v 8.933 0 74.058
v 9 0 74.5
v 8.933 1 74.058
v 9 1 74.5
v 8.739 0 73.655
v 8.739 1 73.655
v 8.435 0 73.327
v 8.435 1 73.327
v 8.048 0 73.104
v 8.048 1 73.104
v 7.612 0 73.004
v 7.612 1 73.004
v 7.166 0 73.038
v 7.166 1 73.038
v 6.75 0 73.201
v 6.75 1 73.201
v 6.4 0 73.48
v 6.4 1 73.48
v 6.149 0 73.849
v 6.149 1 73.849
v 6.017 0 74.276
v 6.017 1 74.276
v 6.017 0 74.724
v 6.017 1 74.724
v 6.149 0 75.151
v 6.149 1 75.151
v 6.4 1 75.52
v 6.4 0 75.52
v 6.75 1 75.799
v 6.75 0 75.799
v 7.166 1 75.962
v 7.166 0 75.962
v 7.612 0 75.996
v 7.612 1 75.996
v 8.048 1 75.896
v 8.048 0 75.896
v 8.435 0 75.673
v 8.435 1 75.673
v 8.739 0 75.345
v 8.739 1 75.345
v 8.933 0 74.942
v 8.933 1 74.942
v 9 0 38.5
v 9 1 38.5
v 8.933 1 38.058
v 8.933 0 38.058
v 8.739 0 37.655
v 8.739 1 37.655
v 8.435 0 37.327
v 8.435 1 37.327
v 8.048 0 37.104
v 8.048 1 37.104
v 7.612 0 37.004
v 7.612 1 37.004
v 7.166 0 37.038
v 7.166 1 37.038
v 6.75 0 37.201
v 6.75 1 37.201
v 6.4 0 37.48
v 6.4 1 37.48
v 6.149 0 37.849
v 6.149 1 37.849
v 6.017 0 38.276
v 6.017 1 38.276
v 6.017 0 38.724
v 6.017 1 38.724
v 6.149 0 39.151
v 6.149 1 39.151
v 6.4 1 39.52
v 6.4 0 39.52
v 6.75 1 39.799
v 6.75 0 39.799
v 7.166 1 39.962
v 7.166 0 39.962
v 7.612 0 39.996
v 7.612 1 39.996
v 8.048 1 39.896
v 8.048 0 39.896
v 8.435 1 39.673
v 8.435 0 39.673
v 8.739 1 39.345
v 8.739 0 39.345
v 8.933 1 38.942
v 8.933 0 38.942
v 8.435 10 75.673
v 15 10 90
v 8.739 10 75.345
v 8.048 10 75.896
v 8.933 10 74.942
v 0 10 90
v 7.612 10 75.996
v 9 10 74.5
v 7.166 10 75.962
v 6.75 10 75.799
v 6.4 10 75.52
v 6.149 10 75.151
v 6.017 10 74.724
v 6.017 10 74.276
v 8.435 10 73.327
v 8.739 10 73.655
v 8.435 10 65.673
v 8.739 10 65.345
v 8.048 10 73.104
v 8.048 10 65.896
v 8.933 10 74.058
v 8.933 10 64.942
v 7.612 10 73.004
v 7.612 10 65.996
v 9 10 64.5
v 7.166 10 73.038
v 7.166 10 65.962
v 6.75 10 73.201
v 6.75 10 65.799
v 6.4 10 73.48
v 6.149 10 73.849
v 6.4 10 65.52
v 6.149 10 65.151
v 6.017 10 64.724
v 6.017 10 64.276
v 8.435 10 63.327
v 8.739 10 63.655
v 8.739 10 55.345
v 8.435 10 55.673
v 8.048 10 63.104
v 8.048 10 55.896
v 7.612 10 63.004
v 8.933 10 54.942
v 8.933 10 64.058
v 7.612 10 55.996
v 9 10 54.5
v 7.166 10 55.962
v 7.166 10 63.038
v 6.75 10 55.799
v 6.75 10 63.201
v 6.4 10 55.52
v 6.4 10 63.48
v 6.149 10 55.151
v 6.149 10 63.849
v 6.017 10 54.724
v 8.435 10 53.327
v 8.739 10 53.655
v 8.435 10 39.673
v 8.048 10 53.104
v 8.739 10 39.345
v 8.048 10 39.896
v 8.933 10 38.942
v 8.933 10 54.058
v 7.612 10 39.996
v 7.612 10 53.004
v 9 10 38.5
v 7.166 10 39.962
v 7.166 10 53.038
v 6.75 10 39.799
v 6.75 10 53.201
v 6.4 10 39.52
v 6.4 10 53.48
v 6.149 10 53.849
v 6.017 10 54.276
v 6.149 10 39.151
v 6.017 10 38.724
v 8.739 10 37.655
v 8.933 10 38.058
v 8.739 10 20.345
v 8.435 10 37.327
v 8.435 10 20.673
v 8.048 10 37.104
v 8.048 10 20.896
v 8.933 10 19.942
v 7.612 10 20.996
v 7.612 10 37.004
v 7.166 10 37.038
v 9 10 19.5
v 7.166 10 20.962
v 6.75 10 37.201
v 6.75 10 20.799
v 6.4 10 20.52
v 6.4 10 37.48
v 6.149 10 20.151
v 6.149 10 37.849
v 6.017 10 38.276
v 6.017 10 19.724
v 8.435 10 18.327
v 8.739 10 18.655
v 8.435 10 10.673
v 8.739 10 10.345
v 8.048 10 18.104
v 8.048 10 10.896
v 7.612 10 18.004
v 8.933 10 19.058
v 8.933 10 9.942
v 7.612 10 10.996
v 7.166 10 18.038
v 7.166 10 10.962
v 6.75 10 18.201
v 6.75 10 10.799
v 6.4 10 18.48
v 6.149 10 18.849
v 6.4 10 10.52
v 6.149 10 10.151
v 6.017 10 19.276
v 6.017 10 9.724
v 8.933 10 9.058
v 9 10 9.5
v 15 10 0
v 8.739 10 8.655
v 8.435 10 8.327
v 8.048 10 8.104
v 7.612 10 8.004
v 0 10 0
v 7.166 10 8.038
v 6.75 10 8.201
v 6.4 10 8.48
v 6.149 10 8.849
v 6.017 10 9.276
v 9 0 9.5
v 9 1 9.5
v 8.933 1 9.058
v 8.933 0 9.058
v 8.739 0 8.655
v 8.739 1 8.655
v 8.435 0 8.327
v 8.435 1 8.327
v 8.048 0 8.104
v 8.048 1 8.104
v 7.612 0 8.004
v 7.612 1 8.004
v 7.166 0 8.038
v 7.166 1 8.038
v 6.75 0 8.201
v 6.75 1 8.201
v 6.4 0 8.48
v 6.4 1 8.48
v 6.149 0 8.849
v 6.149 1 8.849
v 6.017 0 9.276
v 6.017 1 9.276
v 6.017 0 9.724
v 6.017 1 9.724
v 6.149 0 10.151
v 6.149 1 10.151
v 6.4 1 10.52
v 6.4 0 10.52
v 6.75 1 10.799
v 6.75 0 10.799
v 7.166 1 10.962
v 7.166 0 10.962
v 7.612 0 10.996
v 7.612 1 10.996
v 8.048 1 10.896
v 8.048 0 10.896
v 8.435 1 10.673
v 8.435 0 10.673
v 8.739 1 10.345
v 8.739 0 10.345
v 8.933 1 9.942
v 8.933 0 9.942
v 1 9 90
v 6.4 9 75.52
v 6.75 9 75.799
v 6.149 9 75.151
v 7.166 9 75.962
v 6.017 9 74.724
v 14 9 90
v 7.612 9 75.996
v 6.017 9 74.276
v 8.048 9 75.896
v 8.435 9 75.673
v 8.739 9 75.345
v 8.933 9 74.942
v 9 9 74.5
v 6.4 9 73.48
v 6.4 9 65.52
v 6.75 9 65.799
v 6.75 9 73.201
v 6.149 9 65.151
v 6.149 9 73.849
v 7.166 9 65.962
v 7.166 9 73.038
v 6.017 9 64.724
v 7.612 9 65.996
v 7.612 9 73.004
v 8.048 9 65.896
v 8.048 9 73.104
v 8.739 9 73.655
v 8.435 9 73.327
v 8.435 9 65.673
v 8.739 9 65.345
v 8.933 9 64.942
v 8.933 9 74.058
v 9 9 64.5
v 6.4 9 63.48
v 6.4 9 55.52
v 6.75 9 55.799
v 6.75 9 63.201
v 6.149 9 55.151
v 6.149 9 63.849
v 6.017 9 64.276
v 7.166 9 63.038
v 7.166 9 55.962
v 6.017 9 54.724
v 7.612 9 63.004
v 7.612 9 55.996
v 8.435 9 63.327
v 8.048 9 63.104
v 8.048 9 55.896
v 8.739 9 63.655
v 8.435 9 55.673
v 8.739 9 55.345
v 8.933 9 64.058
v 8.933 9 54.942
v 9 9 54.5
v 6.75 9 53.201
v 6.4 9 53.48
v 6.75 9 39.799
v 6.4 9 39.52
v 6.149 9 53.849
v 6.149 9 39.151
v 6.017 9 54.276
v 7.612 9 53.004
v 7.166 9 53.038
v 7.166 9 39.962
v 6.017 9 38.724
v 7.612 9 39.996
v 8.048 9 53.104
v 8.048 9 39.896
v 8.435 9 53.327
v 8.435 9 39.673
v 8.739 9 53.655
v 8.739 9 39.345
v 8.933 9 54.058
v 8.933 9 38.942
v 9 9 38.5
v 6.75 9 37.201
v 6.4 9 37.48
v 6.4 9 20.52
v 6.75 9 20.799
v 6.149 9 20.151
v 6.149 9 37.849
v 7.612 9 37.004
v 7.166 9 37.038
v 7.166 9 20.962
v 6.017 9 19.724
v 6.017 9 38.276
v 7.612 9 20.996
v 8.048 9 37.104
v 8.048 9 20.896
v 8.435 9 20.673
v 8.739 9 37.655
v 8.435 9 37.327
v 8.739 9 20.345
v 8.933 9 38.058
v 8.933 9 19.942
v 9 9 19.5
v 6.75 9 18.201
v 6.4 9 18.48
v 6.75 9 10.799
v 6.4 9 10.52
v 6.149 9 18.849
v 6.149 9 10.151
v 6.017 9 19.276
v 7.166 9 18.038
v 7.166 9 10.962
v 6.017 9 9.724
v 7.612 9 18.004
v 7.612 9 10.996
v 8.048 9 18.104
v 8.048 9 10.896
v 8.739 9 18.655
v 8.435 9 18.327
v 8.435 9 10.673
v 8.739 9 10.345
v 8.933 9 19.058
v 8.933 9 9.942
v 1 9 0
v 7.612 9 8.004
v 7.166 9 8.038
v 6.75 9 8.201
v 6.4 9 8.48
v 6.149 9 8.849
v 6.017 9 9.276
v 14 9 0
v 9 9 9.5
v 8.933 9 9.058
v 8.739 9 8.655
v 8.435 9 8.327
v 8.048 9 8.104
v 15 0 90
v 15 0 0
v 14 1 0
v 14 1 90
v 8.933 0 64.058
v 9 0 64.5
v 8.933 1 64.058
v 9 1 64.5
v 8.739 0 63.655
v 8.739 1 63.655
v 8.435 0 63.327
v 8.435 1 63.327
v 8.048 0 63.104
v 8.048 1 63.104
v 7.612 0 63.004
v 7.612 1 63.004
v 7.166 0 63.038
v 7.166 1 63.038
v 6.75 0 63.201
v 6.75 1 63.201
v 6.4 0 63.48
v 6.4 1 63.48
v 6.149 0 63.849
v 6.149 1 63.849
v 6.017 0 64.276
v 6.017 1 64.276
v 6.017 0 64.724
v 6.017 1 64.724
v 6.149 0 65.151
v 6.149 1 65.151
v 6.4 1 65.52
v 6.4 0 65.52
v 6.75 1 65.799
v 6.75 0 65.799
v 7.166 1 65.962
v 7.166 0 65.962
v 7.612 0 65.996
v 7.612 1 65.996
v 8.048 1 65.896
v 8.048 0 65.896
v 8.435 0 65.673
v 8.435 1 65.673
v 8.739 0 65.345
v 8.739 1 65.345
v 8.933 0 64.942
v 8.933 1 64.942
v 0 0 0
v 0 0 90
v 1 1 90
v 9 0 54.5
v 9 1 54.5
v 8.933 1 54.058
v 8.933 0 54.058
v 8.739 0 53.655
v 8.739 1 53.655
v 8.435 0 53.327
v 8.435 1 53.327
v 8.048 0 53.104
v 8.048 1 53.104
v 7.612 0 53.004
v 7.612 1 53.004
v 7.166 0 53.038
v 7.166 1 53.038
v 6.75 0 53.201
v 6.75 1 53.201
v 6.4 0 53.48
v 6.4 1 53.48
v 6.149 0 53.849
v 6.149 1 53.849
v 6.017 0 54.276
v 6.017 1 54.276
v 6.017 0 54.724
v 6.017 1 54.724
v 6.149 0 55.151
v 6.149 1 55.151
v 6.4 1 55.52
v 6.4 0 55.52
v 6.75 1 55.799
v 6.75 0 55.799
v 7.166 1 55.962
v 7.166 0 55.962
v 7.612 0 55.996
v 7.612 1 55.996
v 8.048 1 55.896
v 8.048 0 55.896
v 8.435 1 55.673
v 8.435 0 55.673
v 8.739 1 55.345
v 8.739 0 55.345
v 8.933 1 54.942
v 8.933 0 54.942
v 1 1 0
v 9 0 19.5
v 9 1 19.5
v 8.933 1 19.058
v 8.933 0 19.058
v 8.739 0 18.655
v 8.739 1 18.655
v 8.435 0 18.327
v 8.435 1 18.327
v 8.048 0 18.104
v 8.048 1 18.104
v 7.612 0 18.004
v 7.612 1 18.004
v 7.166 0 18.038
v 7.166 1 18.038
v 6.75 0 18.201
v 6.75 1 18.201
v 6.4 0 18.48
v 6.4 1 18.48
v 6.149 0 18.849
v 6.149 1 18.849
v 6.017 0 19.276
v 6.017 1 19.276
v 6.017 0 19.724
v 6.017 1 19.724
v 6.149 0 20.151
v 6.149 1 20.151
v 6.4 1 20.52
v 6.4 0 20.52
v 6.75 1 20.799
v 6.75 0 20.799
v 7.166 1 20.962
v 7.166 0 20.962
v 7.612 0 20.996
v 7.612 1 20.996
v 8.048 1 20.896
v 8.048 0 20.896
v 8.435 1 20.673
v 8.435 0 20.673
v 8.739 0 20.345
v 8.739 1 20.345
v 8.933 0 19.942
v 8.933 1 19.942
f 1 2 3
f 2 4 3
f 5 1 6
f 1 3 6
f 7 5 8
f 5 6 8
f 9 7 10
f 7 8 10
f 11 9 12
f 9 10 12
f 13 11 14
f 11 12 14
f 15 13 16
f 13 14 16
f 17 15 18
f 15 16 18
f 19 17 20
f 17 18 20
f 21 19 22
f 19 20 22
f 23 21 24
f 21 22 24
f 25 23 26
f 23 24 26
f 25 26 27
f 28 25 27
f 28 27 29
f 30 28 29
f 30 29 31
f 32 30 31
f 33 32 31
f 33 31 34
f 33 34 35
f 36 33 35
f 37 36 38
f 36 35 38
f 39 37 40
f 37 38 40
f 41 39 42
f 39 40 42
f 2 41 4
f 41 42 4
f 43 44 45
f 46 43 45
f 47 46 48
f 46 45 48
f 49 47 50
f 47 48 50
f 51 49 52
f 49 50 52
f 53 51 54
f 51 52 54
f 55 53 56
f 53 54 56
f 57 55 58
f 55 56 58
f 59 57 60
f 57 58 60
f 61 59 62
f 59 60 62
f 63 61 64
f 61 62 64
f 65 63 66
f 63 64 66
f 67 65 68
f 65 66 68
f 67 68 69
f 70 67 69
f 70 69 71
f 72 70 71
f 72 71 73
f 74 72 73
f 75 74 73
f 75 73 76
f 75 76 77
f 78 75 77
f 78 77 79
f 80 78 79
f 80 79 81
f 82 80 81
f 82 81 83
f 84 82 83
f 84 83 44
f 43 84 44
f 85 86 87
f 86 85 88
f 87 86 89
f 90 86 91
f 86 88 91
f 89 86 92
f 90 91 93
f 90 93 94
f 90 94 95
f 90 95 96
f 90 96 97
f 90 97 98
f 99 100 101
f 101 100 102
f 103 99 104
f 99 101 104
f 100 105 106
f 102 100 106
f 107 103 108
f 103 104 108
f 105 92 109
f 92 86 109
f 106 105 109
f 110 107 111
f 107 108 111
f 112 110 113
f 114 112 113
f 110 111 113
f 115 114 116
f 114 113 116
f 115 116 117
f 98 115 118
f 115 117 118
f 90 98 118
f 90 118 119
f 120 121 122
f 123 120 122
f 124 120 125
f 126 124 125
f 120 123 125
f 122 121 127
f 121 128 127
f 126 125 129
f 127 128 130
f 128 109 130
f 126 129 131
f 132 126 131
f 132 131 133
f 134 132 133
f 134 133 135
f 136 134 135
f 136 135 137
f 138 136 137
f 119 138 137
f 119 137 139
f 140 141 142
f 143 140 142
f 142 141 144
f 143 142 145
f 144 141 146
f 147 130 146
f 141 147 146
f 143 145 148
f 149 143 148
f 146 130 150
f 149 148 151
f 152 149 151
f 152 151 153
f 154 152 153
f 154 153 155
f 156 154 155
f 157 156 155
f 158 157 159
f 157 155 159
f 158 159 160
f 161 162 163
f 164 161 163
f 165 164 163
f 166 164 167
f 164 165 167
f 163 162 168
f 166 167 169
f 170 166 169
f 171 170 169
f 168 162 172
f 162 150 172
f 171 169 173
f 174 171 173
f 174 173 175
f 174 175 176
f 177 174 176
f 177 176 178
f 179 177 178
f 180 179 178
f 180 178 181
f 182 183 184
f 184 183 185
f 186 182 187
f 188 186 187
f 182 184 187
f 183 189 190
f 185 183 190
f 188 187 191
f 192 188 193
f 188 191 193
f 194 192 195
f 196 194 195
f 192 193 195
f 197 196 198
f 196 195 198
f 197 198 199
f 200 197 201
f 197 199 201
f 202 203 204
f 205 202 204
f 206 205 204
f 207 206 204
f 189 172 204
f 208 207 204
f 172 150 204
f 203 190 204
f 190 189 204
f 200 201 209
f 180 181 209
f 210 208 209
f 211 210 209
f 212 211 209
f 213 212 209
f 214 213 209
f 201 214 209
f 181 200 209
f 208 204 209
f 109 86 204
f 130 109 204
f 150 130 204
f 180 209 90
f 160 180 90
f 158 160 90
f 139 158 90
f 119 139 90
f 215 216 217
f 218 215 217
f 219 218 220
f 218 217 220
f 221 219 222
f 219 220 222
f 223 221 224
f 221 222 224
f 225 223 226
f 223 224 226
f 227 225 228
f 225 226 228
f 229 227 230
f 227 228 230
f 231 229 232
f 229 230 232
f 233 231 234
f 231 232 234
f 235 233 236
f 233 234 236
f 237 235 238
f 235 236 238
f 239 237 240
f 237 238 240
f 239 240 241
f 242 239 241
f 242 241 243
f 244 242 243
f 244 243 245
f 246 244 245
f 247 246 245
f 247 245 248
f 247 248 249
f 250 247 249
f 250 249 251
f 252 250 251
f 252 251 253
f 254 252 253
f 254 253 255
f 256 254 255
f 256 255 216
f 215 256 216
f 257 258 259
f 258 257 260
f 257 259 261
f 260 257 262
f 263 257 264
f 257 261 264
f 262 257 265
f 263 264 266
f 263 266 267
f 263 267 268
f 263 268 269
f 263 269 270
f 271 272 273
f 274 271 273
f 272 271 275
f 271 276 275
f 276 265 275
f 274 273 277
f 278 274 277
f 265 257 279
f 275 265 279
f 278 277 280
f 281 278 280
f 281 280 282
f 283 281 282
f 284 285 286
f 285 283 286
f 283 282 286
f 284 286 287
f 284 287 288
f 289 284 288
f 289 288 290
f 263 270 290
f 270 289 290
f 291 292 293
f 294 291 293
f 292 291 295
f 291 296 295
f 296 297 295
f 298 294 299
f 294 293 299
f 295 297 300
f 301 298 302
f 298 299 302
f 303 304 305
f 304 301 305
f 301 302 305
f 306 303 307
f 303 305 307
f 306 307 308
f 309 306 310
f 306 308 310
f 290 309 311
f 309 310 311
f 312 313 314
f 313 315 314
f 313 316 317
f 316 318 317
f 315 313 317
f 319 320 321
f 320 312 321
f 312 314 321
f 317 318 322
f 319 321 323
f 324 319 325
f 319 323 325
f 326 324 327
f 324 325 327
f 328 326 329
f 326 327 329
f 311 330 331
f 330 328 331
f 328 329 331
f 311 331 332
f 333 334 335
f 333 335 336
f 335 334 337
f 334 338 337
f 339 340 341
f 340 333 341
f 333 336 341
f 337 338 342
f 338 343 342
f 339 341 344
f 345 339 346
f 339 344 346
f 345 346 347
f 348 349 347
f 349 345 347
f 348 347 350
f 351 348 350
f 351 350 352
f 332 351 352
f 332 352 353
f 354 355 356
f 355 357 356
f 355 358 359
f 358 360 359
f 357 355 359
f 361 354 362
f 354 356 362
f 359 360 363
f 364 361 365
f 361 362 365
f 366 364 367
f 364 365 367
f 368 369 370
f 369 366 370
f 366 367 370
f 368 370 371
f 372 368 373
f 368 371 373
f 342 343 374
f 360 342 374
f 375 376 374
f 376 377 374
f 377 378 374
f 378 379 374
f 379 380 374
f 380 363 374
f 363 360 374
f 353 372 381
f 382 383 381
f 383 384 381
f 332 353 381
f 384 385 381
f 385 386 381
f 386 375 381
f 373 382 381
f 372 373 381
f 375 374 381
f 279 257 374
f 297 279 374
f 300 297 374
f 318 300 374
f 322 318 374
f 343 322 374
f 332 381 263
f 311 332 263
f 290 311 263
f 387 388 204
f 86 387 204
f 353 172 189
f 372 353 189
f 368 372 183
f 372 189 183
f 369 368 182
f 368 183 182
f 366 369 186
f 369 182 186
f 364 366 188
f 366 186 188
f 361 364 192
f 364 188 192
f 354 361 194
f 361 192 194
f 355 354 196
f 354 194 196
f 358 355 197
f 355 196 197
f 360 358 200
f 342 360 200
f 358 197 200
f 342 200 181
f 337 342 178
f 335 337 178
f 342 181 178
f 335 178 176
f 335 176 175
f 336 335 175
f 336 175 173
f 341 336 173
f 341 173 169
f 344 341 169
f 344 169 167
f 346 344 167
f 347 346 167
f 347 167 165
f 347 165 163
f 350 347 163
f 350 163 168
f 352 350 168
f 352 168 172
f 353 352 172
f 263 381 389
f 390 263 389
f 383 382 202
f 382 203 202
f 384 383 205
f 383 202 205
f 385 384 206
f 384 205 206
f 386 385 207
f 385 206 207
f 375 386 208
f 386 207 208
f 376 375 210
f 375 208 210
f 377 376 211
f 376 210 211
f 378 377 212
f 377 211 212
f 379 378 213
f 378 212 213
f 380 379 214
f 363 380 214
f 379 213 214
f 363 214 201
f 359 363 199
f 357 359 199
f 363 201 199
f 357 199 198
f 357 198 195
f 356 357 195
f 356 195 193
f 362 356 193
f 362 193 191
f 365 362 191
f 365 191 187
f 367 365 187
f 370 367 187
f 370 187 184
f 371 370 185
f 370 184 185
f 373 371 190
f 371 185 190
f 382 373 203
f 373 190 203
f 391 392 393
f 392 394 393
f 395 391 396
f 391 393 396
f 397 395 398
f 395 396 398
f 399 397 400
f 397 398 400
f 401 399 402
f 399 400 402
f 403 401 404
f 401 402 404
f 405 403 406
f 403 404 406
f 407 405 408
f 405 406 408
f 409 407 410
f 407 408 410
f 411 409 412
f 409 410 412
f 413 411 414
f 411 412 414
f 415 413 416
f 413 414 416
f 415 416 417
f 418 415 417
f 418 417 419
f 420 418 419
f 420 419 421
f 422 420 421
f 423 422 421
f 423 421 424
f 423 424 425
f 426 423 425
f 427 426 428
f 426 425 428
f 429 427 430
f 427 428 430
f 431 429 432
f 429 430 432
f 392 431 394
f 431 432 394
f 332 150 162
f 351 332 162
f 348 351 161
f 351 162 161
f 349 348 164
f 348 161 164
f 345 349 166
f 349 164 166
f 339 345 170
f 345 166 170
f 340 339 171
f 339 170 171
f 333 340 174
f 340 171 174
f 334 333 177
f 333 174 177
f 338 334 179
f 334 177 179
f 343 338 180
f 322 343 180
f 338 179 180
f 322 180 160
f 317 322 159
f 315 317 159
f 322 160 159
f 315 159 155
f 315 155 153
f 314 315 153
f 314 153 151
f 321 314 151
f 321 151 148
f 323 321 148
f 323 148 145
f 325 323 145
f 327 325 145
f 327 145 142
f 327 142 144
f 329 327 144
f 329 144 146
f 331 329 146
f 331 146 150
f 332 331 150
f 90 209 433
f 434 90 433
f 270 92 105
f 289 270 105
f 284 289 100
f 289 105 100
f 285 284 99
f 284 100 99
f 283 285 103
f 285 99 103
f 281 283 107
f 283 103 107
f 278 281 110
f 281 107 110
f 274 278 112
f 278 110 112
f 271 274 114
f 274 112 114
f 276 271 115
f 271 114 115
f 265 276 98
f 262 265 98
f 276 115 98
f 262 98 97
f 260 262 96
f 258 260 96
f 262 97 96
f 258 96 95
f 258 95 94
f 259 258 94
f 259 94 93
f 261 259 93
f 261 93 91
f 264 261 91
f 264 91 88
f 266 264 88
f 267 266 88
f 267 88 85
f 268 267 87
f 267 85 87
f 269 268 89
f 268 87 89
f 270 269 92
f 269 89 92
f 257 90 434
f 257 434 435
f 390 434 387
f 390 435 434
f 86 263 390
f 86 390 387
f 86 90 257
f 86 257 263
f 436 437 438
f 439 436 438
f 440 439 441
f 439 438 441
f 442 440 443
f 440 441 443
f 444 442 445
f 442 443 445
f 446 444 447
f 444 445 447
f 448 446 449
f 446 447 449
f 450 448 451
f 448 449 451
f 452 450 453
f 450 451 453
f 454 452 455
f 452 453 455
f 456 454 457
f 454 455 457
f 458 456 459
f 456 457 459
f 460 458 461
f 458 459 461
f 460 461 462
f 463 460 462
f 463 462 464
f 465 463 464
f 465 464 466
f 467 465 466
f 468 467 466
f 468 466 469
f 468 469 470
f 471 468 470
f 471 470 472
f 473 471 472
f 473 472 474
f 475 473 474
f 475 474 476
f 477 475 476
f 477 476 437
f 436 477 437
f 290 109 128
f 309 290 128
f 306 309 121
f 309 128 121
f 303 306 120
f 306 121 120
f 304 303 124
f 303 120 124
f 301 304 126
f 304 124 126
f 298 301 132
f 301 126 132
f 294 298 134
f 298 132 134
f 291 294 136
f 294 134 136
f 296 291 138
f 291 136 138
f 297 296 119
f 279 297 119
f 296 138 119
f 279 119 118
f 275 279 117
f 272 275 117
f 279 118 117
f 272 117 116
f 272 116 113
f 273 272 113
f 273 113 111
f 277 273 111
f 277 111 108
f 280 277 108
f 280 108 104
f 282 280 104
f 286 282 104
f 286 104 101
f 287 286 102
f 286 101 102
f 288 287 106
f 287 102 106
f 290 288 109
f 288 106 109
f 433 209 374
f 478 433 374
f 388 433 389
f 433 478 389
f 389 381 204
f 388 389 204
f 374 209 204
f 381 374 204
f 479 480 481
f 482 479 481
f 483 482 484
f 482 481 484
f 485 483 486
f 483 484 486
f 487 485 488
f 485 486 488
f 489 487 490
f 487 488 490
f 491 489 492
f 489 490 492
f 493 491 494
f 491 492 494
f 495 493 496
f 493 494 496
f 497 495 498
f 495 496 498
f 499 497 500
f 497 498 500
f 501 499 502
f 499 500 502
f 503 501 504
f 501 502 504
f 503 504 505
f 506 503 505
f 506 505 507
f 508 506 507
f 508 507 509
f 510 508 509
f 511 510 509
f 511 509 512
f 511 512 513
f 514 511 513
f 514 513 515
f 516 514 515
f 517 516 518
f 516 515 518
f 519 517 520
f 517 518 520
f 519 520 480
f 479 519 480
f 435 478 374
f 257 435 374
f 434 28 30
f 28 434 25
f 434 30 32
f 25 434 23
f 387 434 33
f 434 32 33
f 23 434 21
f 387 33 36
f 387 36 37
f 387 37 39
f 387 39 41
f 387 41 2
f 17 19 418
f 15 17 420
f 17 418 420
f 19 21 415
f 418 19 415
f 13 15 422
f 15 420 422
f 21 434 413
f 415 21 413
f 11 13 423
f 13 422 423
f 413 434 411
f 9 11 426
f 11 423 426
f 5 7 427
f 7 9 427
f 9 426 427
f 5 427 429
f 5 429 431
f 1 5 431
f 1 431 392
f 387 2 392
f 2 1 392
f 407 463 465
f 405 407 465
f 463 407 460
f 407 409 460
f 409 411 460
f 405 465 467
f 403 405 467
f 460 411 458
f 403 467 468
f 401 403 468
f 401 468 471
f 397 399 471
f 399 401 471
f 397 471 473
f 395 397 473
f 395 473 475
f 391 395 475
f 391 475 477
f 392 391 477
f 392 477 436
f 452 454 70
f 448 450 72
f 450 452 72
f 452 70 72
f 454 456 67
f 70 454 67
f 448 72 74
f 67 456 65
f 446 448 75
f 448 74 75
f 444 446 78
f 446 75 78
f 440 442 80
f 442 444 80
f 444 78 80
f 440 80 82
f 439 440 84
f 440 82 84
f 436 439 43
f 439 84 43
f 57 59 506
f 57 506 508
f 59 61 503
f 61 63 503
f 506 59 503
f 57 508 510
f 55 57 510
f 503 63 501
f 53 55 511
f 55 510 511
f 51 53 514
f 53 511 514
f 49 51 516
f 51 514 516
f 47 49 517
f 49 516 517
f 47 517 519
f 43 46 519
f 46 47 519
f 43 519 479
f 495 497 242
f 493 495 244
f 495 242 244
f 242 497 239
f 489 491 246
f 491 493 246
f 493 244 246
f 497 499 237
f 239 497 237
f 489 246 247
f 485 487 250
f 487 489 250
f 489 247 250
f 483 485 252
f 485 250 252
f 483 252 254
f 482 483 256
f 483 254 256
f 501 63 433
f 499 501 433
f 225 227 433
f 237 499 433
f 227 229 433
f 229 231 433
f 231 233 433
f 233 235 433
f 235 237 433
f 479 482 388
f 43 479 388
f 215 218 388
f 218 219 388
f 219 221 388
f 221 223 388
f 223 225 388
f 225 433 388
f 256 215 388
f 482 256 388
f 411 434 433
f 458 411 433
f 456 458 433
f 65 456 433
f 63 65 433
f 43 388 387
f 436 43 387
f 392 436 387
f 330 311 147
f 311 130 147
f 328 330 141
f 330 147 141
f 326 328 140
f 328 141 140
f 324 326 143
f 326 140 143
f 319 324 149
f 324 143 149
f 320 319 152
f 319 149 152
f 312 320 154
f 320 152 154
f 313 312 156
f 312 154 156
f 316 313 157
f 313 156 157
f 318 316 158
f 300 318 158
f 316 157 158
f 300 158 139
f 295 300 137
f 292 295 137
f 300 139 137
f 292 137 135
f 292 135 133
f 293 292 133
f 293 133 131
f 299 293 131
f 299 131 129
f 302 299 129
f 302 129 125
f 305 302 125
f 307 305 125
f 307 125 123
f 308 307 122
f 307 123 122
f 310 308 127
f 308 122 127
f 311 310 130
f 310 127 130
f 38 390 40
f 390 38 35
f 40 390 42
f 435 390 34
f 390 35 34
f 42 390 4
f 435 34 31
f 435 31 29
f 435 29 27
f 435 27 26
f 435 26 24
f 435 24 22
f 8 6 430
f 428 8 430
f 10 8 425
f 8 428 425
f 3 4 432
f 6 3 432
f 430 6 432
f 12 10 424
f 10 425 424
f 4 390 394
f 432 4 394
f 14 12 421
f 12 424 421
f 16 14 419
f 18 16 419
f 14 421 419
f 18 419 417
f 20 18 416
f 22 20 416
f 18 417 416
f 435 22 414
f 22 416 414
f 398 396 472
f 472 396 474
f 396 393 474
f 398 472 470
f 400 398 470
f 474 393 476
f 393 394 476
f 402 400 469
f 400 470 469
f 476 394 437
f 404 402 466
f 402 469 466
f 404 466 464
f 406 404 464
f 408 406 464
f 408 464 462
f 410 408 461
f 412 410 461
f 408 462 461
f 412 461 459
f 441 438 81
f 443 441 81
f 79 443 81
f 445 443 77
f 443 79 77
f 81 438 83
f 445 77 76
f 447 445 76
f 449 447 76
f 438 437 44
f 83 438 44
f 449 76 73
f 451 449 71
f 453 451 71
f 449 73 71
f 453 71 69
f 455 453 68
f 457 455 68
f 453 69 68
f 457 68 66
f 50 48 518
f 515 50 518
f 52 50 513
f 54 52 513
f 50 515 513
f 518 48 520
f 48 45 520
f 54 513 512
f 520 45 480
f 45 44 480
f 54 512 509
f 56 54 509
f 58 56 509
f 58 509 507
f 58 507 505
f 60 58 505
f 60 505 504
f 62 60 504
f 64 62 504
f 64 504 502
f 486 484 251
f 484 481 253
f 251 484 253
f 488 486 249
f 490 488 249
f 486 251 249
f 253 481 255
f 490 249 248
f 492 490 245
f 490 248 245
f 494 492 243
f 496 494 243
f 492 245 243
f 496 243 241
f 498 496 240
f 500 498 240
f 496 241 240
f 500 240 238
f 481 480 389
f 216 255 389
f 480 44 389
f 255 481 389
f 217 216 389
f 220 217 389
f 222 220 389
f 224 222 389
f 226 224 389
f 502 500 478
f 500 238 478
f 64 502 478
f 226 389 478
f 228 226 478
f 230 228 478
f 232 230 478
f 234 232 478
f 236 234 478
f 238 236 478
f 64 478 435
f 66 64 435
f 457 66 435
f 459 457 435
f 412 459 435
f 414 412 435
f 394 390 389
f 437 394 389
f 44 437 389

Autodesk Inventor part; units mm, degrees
ref_plane "YZ Plane" through (0, 0, 0) normal (1, 0, 0) x (0, 1, 0)
ref_plane "XZ Plane" through (0, 0, 0) normal (0, 1, 0) x (-1, 0, 0)
ref_plane "XY Plane" through (0, 0, 0) normal (0, 0, 1) x (1, 0, 0)
sketch "Sketch1" plane through (0, 0, 0) normal (0, 0, 1) x (1, 0, 0)
  line L0 (0, 0) -> (15, 0)
  line L1 (15, 0) -> (15, 10)
  line L2 (15, 10) -> (0, 10)
  line L3 (0, 10) -> (0, 0)
  line L4 (1, 9) -> (14, 9)
  line L5 (14, 9) -> (14, 1)
  line L6 (14, 1) -> (1, 1)
  line L7 (1, 1) -> (1, 9)
  dimension "d0" = 15
  dimension "d1" = 10
  dimension "d2" = 13
  dimension "d3" = 8
  dimension "d4" = 1
  dimension "d5" = 1
extrude "Extrusion1" add sketch "Sketch1" along normal blind 90
sketch "Sketch2" plane through (0, 10, 0) normal (0, 1, 0) x (1, 0, 0)
  line L0 (15, 0) -> (0, 0) projected
  line L1 (0, 0) -> (0, -90) projected
  line L2 (15, -90) -> (0, -90) projected
  line L3 (15, 0) -> (15, -90) projected
  circle A0 centre (7.5, -9.5) radius 1.5
  circle A1 centre (7.5, -74.5) radius 1.5
  circle A2 centre (7.5, -19.5) radius 1.5
  circle A3 centre (7.5, -64.5) radius 1.5
  circle A4 centre (7.5, -54.5) radius 1.5
  circle A5 centre (7.5, -38.5) radius 1.5
  dimension "d8" = 3
  dimension "d9" = 3
  dimension "d10" = 7.5
  dimension "d11" = 7.5
  dimension "d12" = 9.5
  dimension "d13" = 15.5
  dimension "d24" = 3
  dimension "d25" = 3
  dimension "d26" = 3
  dimension "d27" = 3
  dimension "d28" = 7.5
  dimension "d29" = 7.5
  dimension "d30" = 7.5
  dimension "d31" = 7.5
  dimension "d32" = 10
  dimension "d33" = 10
  dimension "d34" = 10
  dimension "d35" = 16
extrude "Extrusion2" cut sketch "Sketch2" against normal up to surface (10 mm away) contours A0 | A1 | A2 | A3 | A4 | A5
sketch "Sketch3" plane through (15, 0, 0) normal (1, 0, 0) x (0, 0, -1)
  line L0 (0, 0) -> (0, 10) projected
  line L1 (0, 10) -> (-90, 10) projected
  line L2 (-90, 0) -> (-90, 10) projected
  line L3 (0, 0) -> (-90, 0) projected
  circle A0 centre (-9, 5) radius 1.5
  circle A1 centre (-85, 5) radius 1.5
  dimension "d16" = 3
  dimension "d17" = 5
  dimension "d18" = 9
  dimension "d21" = 3
  dimension "d22" = 5
  dimension "d23" = 5
extrude "Extrusion3" [suppressed]
properties part number "profile4" material "Aluminum 6061, Welded"
